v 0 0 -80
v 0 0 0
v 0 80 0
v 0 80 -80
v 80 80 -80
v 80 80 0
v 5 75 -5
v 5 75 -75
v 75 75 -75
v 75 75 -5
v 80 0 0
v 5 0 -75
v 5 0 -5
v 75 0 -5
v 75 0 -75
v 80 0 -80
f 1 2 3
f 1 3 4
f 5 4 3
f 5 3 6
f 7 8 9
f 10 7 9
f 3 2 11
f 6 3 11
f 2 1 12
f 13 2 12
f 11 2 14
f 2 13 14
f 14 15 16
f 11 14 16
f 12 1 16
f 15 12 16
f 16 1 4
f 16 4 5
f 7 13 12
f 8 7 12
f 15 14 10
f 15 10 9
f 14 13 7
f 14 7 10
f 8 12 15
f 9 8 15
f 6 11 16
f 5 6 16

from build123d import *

# Parameters (mm, degrees)
ESQUISSE1_W      = 80
ESQUISSE1_H      = 80
EXTRUSION1_DEPTH = 80
COQUE1_T         = -5


with BuildPart() as part:
    # Esquisse1 → Extrusion1 (new body)
    with BuildSketch(Plane(origin=(0, 0, 0), x_dir=(1, 0, 0), z_dir=(0, 1, 0))):
        with Locations((40, 40)):
            Rectangle(ESQUISSE1_W, ESQUISSE1_H)
    extrude(amount=EXTRUSION1_DEPTH)

    # Coque1
    coque1_openings = [part.faces().sort_by_distance(p)[0] for p in [
        (40, 0, -40),
    ]]
    offset(amount=COQUE1_T, openings=coque1_openings, kind=Kind.INTERSECTION)


solid = part.part
